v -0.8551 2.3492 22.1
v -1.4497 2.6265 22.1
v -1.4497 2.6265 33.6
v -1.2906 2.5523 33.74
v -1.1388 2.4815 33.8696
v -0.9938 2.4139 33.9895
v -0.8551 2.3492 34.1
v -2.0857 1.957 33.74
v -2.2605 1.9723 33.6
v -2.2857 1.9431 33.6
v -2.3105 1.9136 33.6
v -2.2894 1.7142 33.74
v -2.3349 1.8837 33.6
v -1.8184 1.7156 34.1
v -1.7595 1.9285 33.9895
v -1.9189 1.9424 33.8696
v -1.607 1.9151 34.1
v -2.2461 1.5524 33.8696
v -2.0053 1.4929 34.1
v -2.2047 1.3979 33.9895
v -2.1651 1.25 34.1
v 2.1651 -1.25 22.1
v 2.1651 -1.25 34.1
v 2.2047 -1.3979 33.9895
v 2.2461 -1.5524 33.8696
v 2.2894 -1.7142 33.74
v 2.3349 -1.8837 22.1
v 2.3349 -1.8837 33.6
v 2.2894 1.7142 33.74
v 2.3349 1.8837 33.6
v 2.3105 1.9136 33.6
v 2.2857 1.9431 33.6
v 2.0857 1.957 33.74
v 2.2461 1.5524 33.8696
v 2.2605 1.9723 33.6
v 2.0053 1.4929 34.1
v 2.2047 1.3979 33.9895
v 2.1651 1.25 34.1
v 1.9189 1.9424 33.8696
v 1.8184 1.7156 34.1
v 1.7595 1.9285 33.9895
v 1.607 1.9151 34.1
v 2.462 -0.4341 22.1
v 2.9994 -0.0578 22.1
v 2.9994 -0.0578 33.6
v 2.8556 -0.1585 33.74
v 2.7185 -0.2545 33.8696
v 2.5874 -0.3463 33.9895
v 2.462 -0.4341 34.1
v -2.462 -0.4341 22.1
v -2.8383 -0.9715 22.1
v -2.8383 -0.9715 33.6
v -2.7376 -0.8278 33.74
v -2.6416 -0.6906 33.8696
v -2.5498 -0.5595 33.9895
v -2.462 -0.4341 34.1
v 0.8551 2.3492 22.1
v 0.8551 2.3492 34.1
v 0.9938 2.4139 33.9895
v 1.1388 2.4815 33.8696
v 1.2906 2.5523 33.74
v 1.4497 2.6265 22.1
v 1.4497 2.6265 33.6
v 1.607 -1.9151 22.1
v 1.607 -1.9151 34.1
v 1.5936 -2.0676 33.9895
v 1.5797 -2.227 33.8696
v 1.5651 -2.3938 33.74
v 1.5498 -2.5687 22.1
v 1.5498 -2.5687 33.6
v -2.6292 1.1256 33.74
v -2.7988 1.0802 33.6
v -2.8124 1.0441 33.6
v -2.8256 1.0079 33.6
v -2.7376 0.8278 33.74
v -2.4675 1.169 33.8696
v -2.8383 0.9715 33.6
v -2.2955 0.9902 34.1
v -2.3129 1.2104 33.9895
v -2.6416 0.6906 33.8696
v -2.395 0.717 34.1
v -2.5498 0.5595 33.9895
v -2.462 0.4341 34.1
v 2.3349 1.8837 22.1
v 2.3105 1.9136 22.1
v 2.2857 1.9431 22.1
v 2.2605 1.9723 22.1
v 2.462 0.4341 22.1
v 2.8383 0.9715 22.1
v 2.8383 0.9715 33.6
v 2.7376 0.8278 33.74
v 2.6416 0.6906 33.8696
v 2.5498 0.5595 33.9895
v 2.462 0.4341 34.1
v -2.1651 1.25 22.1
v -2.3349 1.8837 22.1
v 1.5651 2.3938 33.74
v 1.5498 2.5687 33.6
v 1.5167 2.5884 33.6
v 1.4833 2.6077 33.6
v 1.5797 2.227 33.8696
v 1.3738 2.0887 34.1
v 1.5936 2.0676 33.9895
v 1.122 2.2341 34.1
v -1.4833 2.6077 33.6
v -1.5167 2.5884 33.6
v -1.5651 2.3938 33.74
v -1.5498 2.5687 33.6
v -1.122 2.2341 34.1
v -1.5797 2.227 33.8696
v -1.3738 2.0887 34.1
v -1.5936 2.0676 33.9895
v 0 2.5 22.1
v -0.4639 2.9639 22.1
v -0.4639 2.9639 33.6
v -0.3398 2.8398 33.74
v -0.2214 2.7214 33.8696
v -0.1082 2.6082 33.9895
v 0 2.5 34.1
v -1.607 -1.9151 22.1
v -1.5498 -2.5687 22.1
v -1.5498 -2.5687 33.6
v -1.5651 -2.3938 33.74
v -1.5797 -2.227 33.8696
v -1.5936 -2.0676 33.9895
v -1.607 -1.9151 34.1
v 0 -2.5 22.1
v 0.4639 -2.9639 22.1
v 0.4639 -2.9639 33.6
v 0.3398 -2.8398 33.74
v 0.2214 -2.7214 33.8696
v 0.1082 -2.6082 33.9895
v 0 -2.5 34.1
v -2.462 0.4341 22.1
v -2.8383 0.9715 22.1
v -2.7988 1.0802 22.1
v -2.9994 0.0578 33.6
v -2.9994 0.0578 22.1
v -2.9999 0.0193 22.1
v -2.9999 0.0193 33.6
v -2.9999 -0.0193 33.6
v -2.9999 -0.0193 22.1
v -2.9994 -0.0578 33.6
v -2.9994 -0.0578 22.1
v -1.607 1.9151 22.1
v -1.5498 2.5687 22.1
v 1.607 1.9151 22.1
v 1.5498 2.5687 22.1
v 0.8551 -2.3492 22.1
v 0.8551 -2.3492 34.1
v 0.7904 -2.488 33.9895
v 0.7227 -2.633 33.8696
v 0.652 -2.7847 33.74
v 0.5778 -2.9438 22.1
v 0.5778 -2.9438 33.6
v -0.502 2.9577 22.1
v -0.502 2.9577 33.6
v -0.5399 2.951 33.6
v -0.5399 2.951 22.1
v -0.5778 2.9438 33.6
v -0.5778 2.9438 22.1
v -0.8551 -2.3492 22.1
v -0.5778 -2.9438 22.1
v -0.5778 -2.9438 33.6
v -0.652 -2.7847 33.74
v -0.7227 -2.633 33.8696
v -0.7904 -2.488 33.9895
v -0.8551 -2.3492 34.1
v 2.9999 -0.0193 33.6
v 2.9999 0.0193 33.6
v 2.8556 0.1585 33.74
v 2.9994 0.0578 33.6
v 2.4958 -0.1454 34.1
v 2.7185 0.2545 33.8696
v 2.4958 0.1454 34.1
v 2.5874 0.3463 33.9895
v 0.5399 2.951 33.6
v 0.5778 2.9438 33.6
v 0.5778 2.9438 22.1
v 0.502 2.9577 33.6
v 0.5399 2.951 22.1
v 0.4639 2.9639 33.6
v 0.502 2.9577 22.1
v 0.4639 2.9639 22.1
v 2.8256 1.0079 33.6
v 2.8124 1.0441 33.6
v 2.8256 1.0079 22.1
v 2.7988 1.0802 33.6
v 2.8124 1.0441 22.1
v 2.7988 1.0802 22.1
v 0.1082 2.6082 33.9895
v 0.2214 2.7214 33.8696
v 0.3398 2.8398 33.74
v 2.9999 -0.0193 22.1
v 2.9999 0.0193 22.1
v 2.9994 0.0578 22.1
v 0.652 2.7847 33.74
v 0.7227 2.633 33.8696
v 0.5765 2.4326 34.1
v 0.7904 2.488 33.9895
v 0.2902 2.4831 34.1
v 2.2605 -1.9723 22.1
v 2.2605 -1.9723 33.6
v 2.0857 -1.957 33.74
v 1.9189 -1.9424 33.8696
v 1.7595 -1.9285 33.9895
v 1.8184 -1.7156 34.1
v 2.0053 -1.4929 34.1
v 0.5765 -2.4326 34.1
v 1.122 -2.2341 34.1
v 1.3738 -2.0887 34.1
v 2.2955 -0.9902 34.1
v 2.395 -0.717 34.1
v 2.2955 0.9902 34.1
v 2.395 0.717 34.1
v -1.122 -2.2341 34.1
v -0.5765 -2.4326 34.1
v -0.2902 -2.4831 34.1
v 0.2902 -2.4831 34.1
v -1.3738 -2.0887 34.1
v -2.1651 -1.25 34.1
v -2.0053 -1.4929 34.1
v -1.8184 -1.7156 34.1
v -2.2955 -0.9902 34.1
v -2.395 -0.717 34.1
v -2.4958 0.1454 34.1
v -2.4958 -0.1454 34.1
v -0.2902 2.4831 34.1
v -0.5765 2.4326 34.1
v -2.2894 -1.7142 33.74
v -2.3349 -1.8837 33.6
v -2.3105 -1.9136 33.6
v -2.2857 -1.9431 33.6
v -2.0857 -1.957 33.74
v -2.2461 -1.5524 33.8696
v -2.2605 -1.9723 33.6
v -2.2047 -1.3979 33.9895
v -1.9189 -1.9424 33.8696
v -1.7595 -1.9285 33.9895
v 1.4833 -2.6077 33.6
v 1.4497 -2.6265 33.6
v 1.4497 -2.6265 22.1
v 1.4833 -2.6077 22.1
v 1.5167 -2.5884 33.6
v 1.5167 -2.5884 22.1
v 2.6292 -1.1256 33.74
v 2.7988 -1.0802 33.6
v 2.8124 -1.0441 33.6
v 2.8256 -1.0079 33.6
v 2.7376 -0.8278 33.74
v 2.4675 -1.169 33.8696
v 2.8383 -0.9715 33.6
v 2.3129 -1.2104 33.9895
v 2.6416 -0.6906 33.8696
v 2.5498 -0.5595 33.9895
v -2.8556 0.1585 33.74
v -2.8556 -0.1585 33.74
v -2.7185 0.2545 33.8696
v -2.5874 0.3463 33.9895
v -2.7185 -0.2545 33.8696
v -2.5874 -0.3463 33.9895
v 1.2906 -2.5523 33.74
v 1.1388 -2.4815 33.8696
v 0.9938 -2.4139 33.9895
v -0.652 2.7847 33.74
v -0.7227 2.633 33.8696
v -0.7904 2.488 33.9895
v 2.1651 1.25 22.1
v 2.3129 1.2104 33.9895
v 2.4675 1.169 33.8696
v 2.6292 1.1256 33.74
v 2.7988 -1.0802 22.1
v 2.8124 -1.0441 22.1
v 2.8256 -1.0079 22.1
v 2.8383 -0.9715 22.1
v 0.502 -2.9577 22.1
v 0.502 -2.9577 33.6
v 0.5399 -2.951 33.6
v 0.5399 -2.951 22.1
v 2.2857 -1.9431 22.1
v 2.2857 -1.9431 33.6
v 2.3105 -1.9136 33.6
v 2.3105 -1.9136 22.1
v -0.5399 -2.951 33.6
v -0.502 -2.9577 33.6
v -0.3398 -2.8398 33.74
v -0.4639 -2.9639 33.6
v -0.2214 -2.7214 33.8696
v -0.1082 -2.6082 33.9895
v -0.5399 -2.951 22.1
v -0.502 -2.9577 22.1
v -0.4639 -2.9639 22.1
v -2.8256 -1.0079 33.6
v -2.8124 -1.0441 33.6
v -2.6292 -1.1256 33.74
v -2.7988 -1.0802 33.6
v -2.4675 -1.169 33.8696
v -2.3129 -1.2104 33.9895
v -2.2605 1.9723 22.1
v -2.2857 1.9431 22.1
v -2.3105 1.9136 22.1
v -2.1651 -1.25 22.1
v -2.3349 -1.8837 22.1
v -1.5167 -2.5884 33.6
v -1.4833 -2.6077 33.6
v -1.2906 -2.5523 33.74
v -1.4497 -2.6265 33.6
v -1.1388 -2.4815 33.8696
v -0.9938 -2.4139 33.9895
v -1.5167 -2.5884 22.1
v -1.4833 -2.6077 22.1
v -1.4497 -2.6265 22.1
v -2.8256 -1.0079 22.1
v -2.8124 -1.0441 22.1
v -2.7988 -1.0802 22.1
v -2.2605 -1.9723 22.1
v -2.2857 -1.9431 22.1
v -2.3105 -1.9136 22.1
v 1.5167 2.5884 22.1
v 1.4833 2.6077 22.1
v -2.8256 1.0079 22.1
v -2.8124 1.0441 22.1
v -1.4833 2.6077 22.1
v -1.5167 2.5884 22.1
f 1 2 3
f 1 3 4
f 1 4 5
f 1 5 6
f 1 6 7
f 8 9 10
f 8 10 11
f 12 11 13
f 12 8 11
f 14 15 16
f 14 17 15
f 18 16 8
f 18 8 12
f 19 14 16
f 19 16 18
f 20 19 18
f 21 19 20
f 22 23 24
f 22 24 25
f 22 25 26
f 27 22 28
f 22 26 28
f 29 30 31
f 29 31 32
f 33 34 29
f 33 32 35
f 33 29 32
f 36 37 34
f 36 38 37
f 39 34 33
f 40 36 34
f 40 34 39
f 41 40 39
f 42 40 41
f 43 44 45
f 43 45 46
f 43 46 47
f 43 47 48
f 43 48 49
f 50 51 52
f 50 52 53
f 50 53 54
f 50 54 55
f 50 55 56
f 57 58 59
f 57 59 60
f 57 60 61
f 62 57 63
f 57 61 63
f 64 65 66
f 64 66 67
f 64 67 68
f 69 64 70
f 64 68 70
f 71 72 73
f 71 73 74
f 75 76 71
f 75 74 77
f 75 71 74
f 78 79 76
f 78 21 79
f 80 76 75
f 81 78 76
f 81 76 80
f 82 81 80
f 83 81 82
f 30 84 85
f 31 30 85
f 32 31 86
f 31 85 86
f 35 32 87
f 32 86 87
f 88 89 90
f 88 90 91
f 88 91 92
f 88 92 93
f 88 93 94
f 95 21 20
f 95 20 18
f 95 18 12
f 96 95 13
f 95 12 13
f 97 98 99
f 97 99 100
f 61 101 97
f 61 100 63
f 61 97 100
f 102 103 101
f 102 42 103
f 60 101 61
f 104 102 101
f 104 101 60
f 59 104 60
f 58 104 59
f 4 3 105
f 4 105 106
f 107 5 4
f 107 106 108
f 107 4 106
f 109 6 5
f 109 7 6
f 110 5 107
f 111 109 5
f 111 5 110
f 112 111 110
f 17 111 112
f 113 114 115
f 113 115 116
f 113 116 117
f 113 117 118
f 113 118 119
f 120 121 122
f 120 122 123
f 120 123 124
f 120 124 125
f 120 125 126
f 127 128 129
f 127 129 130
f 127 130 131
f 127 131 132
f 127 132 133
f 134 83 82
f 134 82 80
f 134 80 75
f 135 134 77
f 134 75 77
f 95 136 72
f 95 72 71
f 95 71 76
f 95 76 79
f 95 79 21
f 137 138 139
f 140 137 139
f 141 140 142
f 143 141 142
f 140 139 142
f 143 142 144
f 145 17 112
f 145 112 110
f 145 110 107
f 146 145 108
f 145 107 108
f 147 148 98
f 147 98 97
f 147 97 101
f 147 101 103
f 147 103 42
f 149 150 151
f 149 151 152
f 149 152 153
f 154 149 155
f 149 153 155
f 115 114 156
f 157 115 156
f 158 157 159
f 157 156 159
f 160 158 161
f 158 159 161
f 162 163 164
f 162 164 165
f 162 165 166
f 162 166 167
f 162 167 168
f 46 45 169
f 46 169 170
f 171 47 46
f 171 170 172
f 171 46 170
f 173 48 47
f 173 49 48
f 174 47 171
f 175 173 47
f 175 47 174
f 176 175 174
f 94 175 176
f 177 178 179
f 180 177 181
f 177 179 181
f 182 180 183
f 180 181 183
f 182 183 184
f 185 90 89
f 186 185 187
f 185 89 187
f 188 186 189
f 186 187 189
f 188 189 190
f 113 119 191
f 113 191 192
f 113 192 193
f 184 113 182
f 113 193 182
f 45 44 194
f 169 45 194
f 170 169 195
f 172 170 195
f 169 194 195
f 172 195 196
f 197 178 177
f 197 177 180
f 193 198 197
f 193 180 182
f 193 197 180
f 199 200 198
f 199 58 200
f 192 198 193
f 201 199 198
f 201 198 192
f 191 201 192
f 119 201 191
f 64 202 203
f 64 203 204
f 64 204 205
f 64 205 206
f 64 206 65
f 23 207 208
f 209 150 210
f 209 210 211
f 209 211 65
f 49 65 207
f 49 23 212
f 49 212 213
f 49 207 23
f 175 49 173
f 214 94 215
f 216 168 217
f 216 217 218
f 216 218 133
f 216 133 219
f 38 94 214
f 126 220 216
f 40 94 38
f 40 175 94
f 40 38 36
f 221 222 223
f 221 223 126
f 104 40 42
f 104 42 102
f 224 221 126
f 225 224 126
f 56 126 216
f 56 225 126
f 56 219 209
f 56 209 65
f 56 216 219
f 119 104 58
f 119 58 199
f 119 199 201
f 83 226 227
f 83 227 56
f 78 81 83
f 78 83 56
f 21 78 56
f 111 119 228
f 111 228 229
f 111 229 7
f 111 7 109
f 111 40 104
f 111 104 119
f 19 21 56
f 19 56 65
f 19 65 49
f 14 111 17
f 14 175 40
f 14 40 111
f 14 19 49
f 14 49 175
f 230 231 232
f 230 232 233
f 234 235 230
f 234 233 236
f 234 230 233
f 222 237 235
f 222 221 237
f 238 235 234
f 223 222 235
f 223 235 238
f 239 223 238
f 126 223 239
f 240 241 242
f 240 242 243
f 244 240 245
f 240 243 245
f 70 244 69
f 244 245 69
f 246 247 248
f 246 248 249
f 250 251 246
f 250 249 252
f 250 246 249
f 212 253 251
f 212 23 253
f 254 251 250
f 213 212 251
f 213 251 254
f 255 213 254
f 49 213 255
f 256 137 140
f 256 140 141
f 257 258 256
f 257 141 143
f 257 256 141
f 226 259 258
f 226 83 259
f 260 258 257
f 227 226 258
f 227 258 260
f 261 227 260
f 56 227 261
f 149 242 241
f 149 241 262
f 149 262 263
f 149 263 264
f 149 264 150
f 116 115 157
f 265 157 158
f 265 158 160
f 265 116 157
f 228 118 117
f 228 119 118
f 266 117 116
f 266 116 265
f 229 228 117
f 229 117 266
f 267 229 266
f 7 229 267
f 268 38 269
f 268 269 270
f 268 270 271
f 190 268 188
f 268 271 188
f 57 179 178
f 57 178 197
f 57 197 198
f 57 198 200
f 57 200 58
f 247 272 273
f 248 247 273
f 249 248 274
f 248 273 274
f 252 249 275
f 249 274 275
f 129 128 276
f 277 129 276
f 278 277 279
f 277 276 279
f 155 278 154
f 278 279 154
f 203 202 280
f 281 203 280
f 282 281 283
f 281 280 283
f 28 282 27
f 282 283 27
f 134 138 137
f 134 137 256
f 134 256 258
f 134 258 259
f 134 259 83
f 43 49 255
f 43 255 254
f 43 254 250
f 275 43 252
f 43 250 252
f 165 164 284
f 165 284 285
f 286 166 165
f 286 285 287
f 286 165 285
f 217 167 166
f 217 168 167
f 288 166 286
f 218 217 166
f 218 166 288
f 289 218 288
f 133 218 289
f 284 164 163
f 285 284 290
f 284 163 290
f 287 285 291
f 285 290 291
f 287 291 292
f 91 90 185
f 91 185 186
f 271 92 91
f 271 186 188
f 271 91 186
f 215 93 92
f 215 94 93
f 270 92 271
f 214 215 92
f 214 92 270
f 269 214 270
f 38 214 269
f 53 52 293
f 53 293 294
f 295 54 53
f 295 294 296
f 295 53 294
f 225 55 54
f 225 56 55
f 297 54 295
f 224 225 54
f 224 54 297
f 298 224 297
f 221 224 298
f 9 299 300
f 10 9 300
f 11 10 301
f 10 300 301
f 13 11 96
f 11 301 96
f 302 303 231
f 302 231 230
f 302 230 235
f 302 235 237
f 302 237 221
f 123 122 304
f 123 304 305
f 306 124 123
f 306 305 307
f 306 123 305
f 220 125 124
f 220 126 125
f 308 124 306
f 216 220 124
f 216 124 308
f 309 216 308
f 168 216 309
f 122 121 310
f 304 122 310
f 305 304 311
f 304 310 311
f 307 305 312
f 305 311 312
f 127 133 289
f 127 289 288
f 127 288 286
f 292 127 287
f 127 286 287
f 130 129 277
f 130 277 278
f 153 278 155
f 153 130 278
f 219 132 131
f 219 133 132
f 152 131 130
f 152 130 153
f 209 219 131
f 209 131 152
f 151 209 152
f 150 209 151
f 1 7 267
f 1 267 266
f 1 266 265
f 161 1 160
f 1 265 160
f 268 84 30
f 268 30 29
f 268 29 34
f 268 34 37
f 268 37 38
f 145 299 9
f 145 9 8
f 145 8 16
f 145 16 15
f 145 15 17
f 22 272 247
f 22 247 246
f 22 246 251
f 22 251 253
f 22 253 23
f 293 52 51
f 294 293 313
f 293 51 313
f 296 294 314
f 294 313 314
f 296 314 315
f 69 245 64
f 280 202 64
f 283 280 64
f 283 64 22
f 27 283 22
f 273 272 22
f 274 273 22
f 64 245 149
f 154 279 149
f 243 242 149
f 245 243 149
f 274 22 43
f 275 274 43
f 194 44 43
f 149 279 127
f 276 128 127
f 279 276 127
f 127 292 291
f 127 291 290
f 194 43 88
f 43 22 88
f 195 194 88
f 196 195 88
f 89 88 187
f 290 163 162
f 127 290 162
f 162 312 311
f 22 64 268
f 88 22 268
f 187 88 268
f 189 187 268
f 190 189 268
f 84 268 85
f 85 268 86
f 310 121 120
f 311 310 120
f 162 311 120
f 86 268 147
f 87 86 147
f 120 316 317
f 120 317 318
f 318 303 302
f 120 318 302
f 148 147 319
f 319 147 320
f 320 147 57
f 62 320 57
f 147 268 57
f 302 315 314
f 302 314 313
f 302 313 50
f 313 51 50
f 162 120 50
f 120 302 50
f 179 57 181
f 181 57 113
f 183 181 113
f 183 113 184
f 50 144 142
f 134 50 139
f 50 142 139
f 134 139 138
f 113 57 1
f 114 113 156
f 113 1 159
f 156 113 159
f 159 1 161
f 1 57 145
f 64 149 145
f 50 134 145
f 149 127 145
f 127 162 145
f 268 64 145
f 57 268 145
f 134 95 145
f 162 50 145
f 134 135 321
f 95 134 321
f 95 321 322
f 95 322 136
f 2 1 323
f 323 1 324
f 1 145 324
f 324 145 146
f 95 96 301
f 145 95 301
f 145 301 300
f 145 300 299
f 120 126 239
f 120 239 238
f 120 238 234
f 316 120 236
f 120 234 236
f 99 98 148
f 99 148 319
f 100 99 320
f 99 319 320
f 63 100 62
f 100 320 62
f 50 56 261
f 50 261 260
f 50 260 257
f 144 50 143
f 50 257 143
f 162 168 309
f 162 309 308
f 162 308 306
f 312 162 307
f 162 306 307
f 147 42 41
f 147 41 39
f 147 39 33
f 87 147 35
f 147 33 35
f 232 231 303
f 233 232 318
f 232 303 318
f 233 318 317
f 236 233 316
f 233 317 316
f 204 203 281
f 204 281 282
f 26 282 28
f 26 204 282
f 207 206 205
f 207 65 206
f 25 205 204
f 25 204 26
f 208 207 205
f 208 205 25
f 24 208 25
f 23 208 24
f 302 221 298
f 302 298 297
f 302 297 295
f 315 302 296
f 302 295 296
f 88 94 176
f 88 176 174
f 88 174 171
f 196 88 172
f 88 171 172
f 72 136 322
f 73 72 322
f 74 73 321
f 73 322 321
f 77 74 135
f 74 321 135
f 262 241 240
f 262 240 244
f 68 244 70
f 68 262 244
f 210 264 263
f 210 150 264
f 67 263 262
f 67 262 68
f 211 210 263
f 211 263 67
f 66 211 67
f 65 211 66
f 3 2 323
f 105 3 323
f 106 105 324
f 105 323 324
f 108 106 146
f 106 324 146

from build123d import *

# Parameters (mm, degrees)
SKETCH009_R           = 3
PAD006_DEPTH          = 12
CHAMFER001_SIZE       = 0.5
POCKET002_DEPTH       = 12
POLARPATTERN001_COUNT = 18


with BuildPart() as part:
    # Sketch009 → Pad006 (new body)
    with BuildSketch(Plane(origin=(0, 0, 22.1), x_dir=(0, 1, 0), z_dir=(0, 0, 1))):
        Circle(SKETCH009_R)
    extrude(amount=PAD006_DEPTH)

    # Chamfer001
    chamfer001_edges = [part.edges().sort_by_distance(p)[0] for p in [
        (0, -3, 34.1),
    ]]
    chamfer(chamfer001_edges, length=CHAMFER001_SIZE)

    # Sketch011 (on Face4 of Chamfer001) → Pocket002 (cut)
    with BuildSketch(Plane.XY.offset(34.1)):
        Polygon((0, 2.5), (2.617639, 5.117639), (-2.617639, 5.117639), align=None)
    pocket002 = extrude(amount=-POCKET002_DEPTH, mode=Mode.SUBTRACT)

    # PolarPattern001: Pocket002 ×18 about axis
    polarpattern001_axis = Axis((0, 0, 34.1), (0, 0, 1))
    for i in range(1, POLARPATTERN001_COUNT):
        add(pocket002.rotate(polarpattern001_axis, i * 360 / POLARPATTERN001_COUNT), mode=Mode.SUBTRACT)


solid = part.part
